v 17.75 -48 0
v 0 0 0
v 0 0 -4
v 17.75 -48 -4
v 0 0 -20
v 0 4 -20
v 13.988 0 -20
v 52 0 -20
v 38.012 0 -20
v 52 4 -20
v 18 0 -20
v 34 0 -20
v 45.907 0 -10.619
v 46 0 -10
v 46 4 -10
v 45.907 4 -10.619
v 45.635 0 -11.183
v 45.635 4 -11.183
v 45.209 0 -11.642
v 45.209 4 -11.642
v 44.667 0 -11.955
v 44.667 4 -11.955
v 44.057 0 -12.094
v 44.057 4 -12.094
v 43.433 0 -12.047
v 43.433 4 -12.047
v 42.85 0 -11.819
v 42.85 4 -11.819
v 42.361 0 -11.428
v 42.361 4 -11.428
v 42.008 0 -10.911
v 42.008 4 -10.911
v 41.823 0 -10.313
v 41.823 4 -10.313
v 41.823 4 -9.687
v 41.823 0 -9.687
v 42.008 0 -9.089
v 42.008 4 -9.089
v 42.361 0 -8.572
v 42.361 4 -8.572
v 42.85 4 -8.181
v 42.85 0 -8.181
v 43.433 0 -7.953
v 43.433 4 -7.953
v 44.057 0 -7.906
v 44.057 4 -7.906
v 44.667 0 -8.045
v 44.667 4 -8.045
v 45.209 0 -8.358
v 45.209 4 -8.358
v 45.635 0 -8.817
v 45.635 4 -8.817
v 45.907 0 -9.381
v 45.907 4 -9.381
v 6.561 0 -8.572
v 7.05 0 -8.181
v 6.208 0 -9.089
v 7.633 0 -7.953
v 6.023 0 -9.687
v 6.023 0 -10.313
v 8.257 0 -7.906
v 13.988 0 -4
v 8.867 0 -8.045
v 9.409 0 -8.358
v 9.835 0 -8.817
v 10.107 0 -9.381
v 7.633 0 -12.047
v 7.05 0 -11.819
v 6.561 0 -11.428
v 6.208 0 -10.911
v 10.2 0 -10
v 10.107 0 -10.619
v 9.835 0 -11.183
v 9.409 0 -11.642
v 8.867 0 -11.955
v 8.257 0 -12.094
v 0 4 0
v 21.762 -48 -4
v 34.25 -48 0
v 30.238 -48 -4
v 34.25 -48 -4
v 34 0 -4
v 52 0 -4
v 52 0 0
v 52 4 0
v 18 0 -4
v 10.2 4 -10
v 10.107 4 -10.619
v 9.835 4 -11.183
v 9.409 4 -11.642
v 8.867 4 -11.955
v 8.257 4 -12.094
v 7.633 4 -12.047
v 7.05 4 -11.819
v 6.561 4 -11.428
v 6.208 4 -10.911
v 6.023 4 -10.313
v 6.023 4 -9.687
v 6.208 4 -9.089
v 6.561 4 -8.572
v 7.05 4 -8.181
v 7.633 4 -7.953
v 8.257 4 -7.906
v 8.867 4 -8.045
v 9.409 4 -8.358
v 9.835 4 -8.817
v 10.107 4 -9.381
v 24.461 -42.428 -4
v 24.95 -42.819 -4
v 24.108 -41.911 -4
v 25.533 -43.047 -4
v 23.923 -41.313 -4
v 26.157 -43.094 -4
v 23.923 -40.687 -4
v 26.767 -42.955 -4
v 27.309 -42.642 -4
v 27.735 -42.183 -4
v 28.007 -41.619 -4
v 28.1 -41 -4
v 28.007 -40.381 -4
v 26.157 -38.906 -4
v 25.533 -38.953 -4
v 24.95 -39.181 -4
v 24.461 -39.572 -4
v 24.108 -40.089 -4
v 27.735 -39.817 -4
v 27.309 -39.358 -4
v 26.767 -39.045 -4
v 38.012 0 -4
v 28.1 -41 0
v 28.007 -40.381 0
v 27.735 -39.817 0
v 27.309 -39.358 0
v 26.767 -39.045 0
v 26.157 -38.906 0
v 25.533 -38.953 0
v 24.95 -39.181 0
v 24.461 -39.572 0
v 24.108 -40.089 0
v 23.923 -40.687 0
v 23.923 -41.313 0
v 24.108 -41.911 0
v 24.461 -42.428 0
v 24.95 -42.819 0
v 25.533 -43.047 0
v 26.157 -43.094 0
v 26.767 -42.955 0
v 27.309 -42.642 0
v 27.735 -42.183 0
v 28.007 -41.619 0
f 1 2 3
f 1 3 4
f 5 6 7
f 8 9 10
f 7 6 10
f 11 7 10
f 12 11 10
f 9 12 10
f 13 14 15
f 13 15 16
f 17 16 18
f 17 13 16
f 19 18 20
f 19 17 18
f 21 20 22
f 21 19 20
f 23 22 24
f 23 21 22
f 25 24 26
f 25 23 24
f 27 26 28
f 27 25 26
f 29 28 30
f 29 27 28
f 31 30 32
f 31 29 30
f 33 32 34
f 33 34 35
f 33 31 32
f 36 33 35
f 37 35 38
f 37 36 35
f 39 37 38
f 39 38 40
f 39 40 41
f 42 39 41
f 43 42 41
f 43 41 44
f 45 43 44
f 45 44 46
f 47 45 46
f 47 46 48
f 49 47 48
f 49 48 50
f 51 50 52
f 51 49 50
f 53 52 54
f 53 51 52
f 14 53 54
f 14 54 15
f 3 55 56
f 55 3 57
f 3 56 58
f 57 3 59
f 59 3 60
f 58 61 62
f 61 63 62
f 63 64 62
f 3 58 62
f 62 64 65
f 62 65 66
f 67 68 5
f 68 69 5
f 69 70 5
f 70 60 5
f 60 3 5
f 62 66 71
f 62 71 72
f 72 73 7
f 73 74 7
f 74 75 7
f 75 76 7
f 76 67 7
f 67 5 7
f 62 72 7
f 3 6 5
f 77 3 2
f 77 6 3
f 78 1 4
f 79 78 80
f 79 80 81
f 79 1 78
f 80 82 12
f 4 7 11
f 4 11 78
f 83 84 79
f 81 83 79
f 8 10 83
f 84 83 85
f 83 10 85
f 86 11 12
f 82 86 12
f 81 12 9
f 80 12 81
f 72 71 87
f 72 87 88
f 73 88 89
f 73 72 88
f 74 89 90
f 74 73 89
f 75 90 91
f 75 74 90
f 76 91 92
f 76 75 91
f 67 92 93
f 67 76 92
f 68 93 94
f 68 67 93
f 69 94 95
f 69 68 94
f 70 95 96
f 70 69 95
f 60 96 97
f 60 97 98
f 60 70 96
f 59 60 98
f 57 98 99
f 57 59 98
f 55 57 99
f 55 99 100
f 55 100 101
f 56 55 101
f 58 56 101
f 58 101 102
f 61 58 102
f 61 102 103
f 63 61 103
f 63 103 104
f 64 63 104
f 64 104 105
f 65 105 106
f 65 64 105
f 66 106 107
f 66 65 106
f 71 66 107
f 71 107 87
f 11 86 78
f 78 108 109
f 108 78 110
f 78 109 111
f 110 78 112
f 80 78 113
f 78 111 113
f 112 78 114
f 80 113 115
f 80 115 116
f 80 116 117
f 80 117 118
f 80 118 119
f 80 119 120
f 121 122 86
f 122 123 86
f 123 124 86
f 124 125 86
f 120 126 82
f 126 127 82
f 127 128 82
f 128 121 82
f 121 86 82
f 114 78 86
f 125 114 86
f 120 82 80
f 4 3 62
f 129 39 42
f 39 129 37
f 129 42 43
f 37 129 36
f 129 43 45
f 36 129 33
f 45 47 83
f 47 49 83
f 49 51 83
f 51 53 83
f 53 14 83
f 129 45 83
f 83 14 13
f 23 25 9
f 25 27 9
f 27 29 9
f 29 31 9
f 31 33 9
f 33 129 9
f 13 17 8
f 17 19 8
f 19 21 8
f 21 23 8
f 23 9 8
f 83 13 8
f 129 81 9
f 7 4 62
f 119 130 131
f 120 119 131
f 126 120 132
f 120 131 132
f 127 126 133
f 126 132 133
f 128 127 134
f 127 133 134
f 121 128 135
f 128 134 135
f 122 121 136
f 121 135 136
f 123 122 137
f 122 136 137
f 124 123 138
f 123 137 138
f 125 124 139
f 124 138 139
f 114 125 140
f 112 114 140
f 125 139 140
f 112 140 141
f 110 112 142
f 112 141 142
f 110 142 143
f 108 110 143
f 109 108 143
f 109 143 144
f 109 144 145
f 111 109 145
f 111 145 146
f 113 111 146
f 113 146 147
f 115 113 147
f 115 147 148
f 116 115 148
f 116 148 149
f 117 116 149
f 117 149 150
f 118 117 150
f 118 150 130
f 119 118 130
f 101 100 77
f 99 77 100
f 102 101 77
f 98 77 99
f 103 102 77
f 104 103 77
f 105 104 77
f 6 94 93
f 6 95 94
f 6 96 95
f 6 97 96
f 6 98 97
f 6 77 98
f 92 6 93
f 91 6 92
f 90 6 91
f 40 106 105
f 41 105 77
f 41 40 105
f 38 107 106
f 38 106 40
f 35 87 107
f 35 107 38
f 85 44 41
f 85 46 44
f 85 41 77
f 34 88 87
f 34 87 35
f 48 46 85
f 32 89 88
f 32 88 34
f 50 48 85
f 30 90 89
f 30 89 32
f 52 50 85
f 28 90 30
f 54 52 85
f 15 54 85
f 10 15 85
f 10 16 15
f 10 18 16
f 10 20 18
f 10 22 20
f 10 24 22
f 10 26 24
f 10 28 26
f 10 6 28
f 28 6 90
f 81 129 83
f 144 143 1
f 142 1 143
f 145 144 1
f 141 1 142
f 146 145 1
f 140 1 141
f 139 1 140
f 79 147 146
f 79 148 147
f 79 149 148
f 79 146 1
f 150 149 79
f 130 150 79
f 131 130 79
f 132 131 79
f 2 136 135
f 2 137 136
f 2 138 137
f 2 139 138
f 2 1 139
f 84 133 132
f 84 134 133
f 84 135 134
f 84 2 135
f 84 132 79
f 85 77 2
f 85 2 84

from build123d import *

# Parameters (mm, degrees)
SKETCH1_W           = 52
SKETCH1_H           = 20
SKETCH1_R           = 2.1
BOSS_EXTRUDE1_DEPTH = 4
SKETCH2_W           = 52
SKETCH2_H           = 4
BOSS_EXTRUDE2_DEPTH = 48
CUT_EXTRUDE1_REACH  = 22
SKETCH3_R           = 2.1
BOSS_EXTRUDE3_DEPTH = 16
CUT_EXTRUDE3_DEPTH  = 53


with BuildPart() as part:
    # Sketch1 → Boss-Extrude1 (new body)
    with BuildSketch(Plane(origin=(0, 0, 0), x_dir=(1, 0, 0), z_dir=(0, 1, 0))):
        with Locations((26, 10)):
            Rectangle(SKETCH1_W, SKETCH1_H)
        with Locations((43.9, 10)):
            Circle(SKETCH1_R, mode=Mode.SUBTRACT)
        with Locations((8.1, 10)):
            Circle(SKETCH1_R, mode=Mode.SUBTRACT)
    extrude(amount=BOSS_EXTRUDE1_DEPTH)

    # Sketch2 → Boss-Extrude2 (add)
    with BuildSketch(Plane.XZ):
        with Locations((26, -2)):
            Rectangle(SKETCH2_W, SKETCH2_H)
    extrude(amount=BOSS_EXTRUDE2_DEPTH)

    # Sketch3 → Cut-Extrude1 (cut, up to next)
    with BuildSketch(Plane.XY, mode=Mode.PRIVATE) as cut_extrude1_sk1:
        with Locations((26, -41)):
            Circle(SKETCH3_R)
    cut_extrude1_tool1 = extrude(cut_extrude1_sk1.sketch, amount=-CUT_EXTRUDE1_REACH, mode=Mode.PRIVATE) & part.part
    add(cut_extrude1_tool1.solids().sort_by_distance((26, -41, 0))[0], mode=Mode.SUBTRACT)
    # Sketch3 → Cut-Extrude1 (cut, up to next)
    with BuildSketch(Plane.XY, mode=Mode.PRIVATE) as cut_extrude1_sk2:
        Polygon((52, 0), (34.25, -48), (52, -48), align=None)
    cut_extrude1_tool2 = extrude(cut_extrude1_sk2.sketch, amount=-CUT_EXTRUDE1_REACH, mode=Mode.PRIVATE) & part.part
    add(cut_extrude1_tool2.solids().sort_by_distance((46.083333, -32, 0))[0], mode=Mode.SUBTRACT)
    # Sketch3 → Cut-Extrude1 (cut, up to next)
    with BuildSketch(Plane.XY, mode=Mode.PRIVATE) as cut_extrude1_sk3:
        Polygon((0, -48), (0, 0), (17.75, -48), align=None)
    cut_extrude1_tool3 = extrude(cut_extrude1_sk3.sketch, amount=-CUT_EXTRUDE1_REACH, mode=Mode.PRIVATE) & part.part
    add(cut_extrude1_tool3.solids().sort_by_distance((5.916667, -32, 0))[0], mode=Mode.SUBTRACT)

    # Sketch5 → Boss-Extrude3 (add)
    with BuildSketch(Plane(origin=(0, 0, -4), x_dir=(-1, 0, 0), z_dir=(0, 0, -1))):
        Polygon((-34.25, -48), (-38.012268219, 0), (-34, 0), (-30.237731781, -48), align=None)
        Polygon((-13.987731781, 0), (-18, 0), (-21.762268219, -48), (-17.75, -48), align=None)
    extrude(amount=BOSS_EXTRUDE3_DEPTH)

    # Sketch6 → Cut-Extrude3 (cut, through all)
    with BuildSketch(Plane.ZY):
        Polygon((-20, 0), (-4, -48), (-20, -48), align=None)
    extrude(amount=-CUT_EXTRUDE3_DEPTH, mode=Mode.SUBTRACT)


solid = part.part
